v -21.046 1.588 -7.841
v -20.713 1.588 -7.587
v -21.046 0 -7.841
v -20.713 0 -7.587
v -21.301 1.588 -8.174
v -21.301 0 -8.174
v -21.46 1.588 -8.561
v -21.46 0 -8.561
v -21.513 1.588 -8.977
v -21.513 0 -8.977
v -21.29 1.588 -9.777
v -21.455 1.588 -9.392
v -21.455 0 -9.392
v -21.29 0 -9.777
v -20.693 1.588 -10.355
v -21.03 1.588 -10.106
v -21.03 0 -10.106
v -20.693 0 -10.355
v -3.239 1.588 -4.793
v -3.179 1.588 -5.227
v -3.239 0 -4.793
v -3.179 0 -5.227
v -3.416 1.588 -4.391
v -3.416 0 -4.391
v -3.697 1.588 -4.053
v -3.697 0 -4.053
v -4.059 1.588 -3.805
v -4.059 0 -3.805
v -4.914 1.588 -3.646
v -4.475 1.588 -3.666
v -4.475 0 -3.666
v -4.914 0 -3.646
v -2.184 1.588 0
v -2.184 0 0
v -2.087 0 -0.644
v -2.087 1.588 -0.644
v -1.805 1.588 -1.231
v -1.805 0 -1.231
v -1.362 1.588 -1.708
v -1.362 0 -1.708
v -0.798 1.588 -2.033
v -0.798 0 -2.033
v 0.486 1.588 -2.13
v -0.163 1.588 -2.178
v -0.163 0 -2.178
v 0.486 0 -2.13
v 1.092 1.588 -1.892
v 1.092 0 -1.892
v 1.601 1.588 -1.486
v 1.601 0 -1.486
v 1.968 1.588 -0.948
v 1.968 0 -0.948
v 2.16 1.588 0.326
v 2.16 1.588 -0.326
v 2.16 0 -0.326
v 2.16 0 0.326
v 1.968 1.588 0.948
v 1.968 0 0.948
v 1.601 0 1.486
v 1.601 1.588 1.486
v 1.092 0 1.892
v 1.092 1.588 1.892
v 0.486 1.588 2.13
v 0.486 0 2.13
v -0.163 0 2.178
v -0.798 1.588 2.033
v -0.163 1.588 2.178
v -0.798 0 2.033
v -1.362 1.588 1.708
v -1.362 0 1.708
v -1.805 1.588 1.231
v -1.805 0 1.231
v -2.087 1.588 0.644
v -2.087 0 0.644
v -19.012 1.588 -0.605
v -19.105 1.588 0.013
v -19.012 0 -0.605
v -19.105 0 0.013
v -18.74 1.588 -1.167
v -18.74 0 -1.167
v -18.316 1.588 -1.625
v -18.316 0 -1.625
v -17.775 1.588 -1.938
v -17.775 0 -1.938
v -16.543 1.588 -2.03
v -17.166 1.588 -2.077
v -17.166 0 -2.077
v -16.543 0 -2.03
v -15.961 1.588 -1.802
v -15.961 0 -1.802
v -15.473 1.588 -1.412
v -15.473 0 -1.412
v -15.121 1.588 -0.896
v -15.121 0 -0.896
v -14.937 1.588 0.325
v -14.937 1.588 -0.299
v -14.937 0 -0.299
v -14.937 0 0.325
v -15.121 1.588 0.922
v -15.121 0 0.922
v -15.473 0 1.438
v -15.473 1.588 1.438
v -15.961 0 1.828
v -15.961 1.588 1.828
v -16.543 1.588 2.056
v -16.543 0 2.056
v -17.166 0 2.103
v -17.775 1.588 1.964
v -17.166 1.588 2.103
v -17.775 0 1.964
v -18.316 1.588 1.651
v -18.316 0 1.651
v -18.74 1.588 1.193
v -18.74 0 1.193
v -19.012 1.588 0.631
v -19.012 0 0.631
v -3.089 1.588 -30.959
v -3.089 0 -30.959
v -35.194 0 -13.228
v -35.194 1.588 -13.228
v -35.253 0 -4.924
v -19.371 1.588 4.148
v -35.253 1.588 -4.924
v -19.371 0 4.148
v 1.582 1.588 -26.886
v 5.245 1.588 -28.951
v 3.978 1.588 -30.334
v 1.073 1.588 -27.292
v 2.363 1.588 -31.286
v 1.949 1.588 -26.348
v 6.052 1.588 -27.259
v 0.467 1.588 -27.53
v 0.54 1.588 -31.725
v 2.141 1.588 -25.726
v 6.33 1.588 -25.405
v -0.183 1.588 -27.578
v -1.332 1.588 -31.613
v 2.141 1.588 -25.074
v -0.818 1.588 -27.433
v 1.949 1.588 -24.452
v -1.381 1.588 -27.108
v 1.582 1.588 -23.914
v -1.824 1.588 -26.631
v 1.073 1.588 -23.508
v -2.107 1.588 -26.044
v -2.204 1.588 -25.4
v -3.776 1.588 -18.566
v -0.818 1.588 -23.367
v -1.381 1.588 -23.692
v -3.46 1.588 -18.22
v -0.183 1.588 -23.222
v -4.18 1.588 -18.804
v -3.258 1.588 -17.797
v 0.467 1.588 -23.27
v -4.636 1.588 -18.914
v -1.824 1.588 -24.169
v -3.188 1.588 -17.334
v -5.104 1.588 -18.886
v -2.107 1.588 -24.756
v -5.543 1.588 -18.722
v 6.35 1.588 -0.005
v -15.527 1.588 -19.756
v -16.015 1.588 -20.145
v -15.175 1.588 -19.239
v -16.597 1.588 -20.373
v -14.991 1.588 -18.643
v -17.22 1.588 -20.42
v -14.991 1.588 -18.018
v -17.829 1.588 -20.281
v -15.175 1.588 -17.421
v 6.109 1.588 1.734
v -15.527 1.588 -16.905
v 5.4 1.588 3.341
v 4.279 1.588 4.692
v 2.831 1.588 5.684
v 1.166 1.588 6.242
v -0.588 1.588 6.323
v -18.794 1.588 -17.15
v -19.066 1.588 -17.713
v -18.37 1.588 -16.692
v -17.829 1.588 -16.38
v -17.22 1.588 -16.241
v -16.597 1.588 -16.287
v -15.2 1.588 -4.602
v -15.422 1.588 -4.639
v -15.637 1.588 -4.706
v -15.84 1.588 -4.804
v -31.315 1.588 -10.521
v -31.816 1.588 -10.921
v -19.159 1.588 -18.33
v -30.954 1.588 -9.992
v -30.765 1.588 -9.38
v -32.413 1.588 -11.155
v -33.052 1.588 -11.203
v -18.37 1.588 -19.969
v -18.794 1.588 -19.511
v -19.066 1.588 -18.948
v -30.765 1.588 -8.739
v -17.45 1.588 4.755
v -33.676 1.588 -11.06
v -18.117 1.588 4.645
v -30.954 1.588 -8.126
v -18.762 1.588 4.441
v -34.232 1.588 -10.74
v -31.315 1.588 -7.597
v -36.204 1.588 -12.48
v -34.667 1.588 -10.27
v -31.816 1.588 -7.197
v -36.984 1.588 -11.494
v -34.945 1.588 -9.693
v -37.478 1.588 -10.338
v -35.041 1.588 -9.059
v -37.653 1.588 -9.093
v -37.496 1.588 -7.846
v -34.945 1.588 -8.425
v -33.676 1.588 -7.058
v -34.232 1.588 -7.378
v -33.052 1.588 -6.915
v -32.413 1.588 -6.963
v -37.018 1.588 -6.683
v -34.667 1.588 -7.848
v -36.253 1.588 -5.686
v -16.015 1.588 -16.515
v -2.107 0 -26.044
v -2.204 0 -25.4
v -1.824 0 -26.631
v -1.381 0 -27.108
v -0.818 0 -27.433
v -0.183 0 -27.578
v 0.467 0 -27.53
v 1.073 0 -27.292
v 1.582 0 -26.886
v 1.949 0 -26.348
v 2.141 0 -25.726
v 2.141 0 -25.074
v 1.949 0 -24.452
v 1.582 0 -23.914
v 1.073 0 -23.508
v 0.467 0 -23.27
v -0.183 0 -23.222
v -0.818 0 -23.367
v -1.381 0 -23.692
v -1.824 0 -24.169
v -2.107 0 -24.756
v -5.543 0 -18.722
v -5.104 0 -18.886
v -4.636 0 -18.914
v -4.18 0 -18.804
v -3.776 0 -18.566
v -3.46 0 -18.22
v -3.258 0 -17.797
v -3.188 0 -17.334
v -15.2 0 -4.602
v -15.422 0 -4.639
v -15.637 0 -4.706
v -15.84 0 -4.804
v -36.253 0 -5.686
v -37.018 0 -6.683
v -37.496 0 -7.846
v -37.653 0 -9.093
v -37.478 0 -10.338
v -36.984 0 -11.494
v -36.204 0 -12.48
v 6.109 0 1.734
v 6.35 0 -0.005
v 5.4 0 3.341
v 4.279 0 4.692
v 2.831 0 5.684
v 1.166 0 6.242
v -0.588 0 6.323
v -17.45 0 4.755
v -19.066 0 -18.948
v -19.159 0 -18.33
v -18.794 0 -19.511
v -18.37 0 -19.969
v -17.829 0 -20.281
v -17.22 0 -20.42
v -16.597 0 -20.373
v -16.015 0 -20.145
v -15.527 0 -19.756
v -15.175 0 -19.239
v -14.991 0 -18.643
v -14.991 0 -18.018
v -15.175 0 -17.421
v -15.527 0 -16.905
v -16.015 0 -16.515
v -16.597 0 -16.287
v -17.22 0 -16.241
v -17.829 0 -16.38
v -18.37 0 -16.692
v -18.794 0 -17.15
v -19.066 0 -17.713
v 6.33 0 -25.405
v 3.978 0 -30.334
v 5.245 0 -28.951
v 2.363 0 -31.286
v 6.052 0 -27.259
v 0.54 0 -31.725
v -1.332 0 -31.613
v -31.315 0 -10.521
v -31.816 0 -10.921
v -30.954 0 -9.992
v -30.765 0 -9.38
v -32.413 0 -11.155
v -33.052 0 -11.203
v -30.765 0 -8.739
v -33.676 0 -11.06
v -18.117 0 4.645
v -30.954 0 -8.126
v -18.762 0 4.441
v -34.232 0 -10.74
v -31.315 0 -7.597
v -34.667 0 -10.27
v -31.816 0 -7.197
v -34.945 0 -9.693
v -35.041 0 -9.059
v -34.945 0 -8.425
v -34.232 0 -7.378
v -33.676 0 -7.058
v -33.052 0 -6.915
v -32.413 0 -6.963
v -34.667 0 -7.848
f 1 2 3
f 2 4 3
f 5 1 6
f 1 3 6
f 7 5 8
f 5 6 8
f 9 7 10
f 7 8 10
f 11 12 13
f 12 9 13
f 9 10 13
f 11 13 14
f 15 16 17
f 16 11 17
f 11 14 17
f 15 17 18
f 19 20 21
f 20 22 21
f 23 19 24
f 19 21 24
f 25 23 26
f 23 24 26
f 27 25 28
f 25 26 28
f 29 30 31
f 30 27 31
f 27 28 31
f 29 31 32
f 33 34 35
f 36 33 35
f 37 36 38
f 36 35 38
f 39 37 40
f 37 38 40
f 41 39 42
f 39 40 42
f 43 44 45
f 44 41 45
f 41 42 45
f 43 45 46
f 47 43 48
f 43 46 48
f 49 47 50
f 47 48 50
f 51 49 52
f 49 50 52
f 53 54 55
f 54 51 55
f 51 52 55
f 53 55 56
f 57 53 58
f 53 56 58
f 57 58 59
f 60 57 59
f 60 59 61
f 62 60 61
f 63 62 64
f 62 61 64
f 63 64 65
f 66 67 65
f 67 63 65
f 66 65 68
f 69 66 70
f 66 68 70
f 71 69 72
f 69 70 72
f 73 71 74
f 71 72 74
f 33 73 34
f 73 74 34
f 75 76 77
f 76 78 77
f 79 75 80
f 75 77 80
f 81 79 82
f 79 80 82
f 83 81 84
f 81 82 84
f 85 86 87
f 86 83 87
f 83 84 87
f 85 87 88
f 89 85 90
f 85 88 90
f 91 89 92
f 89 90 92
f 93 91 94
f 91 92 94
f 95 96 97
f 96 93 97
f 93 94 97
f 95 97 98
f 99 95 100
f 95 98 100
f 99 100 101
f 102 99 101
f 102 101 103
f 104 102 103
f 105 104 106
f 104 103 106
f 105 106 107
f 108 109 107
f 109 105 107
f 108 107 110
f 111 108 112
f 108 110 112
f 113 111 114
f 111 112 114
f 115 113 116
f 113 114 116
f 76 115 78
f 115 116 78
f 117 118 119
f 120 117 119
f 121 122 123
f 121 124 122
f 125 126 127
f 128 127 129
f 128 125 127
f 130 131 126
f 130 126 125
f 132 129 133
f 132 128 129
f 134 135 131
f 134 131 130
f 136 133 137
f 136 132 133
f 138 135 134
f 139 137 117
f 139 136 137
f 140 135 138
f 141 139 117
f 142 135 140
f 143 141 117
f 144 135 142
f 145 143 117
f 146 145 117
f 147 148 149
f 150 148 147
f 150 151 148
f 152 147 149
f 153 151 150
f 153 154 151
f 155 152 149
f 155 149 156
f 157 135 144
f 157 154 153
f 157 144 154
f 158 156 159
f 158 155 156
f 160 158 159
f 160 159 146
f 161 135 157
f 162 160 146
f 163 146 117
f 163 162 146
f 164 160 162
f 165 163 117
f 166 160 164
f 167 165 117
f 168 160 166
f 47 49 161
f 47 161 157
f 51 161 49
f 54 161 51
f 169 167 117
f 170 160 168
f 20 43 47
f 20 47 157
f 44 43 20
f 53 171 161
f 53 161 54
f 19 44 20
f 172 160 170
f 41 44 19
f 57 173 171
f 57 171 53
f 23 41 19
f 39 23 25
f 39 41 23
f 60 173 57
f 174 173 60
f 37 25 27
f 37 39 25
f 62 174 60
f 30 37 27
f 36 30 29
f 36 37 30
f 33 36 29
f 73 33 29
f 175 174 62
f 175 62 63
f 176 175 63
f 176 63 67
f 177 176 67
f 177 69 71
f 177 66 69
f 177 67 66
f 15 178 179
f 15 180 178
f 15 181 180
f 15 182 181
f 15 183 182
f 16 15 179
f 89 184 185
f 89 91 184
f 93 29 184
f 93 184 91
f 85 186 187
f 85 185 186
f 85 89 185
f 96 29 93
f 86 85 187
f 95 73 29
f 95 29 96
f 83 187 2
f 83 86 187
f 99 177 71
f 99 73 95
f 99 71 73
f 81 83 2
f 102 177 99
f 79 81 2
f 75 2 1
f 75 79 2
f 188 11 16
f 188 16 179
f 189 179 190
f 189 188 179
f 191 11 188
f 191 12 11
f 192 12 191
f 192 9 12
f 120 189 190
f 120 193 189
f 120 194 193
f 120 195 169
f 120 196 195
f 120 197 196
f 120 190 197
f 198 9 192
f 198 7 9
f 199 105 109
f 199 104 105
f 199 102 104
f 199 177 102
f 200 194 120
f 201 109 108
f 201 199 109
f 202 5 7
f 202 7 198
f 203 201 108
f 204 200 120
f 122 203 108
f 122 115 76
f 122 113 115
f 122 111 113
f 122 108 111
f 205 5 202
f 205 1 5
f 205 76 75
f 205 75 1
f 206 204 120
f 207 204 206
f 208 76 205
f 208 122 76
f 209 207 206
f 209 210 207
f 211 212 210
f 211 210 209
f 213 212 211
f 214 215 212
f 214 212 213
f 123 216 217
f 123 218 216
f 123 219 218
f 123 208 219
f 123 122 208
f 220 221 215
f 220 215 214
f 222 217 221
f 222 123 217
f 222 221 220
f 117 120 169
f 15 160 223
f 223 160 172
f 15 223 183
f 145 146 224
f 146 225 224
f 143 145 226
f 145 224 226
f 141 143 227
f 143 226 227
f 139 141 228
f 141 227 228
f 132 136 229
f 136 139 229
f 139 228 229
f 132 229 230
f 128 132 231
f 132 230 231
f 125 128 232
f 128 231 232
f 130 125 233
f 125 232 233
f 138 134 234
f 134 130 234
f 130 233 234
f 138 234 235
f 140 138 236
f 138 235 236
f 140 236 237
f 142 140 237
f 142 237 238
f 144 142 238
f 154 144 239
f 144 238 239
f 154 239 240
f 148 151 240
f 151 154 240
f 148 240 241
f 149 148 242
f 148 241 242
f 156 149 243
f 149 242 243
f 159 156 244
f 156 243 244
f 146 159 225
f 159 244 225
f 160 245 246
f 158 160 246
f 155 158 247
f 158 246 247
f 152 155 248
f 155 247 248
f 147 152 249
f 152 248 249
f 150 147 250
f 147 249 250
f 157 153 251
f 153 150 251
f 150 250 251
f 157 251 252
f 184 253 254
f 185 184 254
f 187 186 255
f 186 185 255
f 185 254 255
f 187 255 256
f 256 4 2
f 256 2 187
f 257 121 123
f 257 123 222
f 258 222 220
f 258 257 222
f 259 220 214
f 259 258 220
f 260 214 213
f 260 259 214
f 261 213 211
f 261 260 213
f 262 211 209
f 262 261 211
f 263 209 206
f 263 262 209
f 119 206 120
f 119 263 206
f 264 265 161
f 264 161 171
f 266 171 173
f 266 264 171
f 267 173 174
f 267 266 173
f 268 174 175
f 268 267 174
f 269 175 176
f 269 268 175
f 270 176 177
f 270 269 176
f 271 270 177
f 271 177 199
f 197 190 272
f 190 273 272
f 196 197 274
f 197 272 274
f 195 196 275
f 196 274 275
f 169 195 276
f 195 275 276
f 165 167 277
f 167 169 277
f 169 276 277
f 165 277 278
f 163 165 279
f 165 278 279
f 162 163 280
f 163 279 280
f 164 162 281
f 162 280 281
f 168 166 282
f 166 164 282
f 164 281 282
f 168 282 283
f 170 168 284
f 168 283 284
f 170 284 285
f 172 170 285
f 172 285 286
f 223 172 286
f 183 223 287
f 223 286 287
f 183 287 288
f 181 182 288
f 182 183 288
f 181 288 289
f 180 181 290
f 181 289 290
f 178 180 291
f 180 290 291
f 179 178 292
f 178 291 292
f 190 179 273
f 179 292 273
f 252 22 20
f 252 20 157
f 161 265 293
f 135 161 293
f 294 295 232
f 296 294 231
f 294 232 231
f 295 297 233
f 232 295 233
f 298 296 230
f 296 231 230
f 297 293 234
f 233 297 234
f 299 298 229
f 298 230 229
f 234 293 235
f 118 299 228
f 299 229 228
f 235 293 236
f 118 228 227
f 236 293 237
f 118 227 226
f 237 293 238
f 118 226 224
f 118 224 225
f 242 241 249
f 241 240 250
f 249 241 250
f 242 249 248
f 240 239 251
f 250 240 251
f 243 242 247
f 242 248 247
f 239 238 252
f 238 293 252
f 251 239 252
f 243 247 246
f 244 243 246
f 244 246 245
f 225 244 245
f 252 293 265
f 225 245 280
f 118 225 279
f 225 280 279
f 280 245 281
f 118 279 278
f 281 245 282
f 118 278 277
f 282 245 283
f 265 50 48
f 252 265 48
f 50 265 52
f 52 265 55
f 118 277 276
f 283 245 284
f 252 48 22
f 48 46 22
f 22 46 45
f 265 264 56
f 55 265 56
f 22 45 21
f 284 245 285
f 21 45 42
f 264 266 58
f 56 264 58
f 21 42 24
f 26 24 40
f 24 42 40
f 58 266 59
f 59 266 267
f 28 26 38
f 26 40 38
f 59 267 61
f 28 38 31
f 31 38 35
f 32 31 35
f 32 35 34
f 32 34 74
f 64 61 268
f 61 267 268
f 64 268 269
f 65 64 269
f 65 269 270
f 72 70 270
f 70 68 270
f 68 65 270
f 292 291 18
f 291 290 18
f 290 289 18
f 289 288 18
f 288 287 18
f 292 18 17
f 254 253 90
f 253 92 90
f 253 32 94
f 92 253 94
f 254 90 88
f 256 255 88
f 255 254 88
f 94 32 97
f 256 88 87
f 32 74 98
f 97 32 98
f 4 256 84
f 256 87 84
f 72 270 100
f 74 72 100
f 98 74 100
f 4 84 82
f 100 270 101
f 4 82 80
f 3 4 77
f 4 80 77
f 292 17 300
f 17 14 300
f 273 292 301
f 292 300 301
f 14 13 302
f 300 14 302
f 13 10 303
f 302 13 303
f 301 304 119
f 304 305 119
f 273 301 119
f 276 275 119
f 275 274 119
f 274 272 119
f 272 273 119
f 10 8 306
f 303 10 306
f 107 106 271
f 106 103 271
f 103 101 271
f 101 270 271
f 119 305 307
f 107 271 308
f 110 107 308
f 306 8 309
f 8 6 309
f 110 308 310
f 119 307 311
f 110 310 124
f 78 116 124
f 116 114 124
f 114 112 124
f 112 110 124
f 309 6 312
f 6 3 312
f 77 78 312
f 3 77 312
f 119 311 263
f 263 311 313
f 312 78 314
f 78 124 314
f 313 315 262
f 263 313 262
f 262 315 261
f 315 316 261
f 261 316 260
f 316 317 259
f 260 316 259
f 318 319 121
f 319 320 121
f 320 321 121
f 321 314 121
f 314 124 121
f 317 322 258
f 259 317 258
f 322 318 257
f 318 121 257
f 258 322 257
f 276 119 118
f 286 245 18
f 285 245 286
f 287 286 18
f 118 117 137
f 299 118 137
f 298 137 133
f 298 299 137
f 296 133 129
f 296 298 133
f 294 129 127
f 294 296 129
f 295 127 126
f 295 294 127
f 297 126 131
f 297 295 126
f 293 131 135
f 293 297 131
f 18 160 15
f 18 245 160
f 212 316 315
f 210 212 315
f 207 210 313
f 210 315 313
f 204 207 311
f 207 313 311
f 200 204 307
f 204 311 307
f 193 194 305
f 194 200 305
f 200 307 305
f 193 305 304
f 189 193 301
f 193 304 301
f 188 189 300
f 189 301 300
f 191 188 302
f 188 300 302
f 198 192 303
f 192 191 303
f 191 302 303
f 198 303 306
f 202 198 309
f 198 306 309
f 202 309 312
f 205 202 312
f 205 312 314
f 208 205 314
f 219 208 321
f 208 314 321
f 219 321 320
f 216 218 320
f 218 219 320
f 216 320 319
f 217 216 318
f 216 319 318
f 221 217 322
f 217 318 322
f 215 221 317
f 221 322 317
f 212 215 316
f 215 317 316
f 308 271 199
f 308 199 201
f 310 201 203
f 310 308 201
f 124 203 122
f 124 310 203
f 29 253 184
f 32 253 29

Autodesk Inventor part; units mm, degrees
ref_plane "YZ Plane" through (0, 0, 0) normal (1, 0, 0) x (0, 1, 0)
ref_plane "XZ Plane" through (0, 0, 0) normal (0, 1, 0) x (-1, 0, 0)
ref_plane "XY Plane" through (0, 0, 0) normal (0, 0, 1) x (1, 0, 0)
sketch "main" plane through (0, 0, 0) normal (0, 0, 1) x (1, 0, 0)
  circle A0 centre (15.4343, 10.6591) radius 2.1844
  circle A1 centre (6.35, -22.225) radius 2.15
  circle A2 centre (-9.9657, 10.6591) radius 2.1844
  circle A3 centre (15.4343, -6.35) radius 2.0955
  arc A4 (19.5678, -8.7154) -> (20.176, -6.7945) centre (15.4343, -6.35) ccw
  arc A5 (21.7565, 10.0664) -> (15.4343, 17.0091) centre (15.4343, 10.6591) ccw
  arc A6 (-9.9657, 17.0091) -> (-15.5267, 7.5934) centre (-9.9657, 10.6591) ccw
  arc A7 (2.1793, -24.5243) -> (10.4836, -24.5904) centre (6.35, -22.225) ccw
  line L0 (21.7565, 10.0664) -> (20.176, -6.7945)
  line L1 (15.4343, 17.0091) -> (-9.9657, 17.0091)
  line L2 (-15.5267, 7.5934) -> (2.1793, -24.5243)
  line L3 (19.5678, -8.7154) -> (10.4836, -24.5904)
  line L4 (7.8311, -10.0478) -> (10.6181, -5.1775)
  line L5 (10.8208, -4.5372) -> (11.785, 5.7484)
  line L6 (10.2044, 7.4841) -> (-1.902, 7.4841)
  line L7 (-3.2922, 5.1301) -> (5.063, -10.0258)
  arc A8 (10.6181, -5.1775) -> (10.8208, -4.5372) centre (9.2402, -4.389) ccw
  arc A9 (5.063, -10.0258) -> (7.8311, -10.0478) centre (6.4532, -9.2594) ccw
  arc A10 (-1.902, 7.4841) -> (-3.2922, 5.1301) centre (-1.902, 5.8966) ccw
  arc A11 (11.785, 5.7484) -> (10.2044, 7.4841) centre (10.2044, 5.8966) ccw
  circle A12 centre (-2.909, -6.39) radius 2.0955
  point P0 (7.047, 1.8005)
  dimension "d0" = 4.191
  dimension "d1" = 12.7
  dimension "d2" = 12.7
  dimension "d3" = 9.525
  dimension "d4" = 9.525
  dimension "d5" = 1.5875
  dimension "d8" = 4.7625
  dimension "d9" = 4.191
sketch "Sketch1" plane through (0, 0, 0) normal (0, 1, 0) x (-1, 0, 0)
  circle A0 centre (0, 0) radius 2.1844
  circle A1 centre (32.891, -9.0591) radius 2.15
  circle A2 centre (0.0195, -25.4) radius 2.1844
  circle A3 centre (17.0091, 0.013) radius 2.0955
  arc A4 (19.3713, 4.1484) -> (17.4499, 4.7551) centre (17.0091, 0.013) ccw
  arc A5 (0.5878, 6.3227) -> (-6.35, -0.0049) centre (0, 0) ccw
  arc A6 (-6.3305, -25.4049) -> (3.0894, -30.9586) centre (0.0195, -25.4) ccw
  arc A7 (35.1935, -13.228) -> (35.2532, -4.9237) centre (32.891, -9.0591) ccw
  line L0 (0.5878, 6.3227) -> (17.4499, 4.7551)
  line L1 (-6.35, -0.0049) -> (-6.3305, -25.4049)
  line L2 (3.0894, -30.9586) -> (35.1935, -13.228)
  line L3 (19.3713, 4.1484) -> (35.2532, -4.9237)
  line L4 (20.7127, -7.5873) -> (15.8402, -4.804)
  line L5 (15.1998, -4.6018) -> (4.9135, -3.6455)
  line L6 (3.179, -5.2274) -> (3.1883, -17.3338)
  line L7 (5.5433, -18.7222) -> (20.6928, -10.3554)
  arc A8 (15.8402, -4.804) -> (15.1998, -4.6018) centre (15.0528, -6.1825) ccw
  arc A9 (20.6928, -10.3554) -> (20.7127, -7.5873) centre (19.9253, -8.9657) ccw
  arc A10 (3.1883, -17.3338) -> (5.5433, -18.7222) centre (4.7758, -17.3326) ccw
  arc A11 (4.9135, -3.6455) -> (3.179, -5.2274) centre (4.7665, -5.2262) ccw
  circle A12 centre (17.0631, -18.3302) radius 2.0955
  point P0 (0, 0)
extrude "Extrusion1" add sketch "Sketch1" along normal blind 1.5875
properties part number "mount" material "Acetal Resin, White"
